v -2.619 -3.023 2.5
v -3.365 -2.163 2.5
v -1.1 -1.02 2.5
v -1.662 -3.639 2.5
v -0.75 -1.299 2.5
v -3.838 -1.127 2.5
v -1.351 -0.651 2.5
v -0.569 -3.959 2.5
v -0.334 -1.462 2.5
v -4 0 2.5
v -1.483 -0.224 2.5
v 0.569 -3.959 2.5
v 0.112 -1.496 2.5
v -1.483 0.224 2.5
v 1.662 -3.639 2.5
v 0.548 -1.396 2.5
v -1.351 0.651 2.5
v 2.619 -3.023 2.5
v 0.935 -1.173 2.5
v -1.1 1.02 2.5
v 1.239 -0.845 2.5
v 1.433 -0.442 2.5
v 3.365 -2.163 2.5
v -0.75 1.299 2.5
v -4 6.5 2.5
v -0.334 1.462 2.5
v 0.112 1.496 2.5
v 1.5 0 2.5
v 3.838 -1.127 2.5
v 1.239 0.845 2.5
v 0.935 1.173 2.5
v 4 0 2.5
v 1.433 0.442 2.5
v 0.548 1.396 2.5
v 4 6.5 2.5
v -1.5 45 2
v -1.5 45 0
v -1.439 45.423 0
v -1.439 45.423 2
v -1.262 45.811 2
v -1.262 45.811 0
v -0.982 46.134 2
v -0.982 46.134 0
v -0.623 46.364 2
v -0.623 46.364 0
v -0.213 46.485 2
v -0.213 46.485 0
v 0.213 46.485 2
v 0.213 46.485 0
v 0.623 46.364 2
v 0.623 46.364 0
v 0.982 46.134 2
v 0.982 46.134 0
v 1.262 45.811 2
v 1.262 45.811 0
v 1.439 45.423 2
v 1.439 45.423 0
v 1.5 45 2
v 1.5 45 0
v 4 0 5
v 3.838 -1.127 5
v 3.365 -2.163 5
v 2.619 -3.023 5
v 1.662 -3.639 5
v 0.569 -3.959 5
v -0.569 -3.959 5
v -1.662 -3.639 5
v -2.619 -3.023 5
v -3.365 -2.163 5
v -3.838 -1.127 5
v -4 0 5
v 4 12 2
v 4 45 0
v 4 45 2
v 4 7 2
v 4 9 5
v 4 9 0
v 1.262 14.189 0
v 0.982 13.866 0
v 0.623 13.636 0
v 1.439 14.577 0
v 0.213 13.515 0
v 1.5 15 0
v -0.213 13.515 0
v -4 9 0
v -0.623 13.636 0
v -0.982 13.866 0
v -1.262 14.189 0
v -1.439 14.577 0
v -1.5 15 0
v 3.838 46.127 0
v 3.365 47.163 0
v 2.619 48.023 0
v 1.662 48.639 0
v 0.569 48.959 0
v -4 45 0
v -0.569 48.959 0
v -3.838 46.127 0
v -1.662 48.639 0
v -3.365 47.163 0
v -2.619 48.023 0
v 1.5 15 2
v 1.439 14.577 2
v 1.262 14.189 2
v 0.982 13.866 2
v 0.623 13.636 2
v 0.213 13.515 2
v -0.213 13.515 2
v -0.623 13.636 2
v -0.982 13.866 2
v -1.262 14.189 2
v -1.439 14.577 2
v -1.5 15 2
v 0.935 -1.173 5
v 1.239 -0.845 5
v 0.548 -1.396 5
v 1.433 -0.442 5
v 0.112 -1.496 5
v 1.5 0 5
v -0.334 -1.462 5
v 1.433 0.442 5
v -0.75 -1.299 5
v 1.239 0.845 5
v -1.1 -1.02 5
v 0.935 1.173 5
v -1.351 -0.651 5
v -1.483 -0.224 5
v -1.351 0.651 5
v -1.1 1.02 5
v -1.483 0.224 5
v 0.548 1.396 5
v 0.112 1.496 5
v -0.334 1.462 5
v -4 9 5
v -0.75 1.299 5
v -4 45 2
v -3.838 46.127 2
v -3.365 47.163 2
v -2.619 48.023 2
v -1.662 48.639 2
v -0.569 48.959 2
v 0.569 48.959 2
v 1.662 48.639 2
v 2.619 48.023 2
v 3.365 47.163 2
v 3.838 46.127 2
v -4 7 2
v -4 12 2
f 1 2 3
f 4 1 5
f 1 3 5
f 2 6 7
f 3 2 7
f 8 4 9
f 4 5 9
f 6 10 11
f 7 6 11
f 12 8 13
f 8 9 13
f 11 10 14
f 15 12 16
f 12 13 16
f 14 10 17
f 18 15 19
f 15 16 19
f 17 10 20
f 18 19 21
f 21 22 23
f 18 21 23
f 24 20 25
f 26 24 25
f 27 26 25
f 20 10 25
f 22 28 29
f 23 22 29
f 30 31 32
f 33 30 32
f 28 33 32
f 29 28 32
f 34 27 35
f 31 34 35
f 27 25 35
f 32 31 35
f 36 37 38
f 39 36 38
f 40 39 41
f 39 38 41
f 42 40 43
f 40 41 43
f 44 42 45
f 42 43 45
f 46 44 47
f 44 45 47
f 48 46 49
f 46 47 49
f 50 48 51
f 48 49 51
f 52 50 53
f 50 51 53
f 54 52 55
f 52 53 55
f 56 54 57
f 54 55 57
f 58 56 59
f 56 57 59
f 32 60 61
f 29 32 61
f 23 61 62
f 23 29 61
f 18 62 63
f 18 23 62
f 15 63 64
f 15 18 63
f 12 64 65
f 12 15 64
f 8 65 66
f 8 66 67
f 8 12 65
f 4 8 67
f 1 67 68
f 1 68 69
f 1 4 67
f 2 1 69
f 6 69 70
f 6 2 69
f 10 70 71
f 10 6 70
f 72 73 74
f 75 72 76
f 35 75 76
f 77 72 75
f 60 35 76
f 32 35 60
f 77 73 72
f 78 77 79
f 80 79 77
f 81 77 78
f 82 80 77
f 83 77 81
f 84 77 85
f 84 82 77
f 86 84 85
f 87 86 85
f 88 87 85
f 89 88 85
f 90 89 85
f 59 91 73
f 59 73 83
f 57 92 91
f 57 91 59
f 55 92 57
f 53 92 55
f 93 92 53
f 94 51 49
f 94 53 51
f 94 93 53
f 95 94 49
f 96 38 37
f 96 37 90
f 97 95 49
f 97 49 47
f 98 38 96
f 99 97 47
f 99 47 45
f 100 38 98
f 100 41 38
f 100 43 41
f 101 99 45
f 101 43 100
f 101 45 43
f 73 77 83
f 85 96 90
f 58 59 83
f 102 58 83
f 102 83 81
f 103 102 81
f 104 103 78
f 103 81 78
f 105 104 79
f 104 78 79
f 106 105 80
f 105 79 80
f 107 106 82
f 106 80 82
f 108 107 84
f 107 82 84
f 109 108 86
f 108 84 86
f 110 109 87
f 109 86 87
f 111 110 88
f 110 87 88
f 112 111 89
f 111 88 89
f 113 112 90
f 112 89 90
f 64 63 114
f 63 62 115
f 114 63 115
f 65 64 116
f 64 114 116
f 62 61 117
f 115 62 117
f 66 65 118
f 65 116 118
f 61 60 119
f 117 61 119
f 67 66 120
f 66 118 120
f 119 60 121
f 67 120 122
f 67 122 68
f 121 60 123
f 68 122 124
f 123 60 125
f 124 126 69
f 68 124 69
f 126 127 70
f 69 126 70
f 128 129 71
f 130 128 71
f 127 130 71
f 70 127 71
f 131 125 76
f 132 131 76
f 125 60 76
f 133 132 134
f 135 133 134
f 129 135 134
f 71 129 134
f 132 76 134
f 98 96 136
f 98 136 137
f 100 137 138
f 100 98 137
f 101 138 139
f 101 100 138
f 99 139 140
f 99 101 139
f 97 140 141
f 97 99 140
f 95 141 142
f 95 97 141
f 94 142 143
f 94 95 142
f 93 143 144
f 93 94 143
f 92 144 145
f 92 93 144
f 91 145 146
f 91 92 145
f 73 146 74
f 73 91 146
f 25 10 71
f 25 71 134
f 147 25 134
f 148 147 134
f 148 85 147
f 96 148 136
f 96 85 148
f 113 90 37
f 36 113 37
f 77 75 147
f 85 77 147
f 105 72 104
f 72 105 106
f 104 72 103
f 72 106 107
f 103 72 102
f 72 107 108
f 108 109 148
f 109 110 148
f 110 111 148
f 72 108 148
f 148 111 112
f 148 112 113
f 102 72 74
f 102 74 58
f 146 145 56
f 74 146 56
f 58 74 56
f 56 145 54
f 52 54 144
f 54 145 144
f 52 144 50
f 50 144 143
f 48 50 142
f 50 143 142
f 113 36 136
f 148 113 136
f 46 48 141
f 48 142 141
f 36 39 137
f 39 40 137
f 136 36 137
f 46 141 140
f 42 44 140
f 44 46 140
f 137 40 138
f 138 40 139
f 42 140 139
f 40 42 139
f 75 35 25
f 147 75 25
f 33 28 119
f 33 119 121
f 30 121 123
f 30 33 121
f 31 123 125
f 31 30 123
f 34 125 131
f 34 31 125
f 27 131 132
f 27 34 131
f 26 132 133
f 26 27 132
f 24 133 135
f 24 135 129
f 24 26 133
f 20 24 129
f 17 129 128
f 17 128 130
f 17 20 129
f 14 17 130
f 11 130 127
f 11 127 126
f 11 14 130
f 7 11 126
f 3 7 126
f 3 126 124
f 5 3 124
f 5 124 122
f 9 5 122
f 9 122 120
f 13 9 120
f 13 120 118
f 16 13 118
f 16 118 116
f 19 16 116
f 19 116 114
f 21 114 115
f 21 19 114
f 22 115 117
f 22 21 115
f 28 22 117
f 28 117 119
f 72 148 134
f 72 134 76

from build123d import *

# Parameters (mm, degrees)
SZKIC1_R                    = 1.5
DODANIE_WYCI_GNI_CIE1_DEPTH = 2
SZKIC2_R                    = 1.5
DODANIE_WYCI_GNI_CIE2_DEPTH = 3
WYTNIJ_WYCI_GNI_CIE1_DEPTH  = 2.5
SFAZOWANIE1_SIZE            = 3
SFAZOWANIE2_SIZE            = 2
SFAZOWANIE3_SIZE            = 0.5


with BuildPart() as part:
    # Szkic1 → Dodanie-wyciągnięcie1 (new body)
    with BuildSketch(Plane.XY):
        with BuildLine():
            Line((-4, 0), (-4, 45))
            ThreePointArc((-4, 45), (0, 49), (4, 45))
            Line((4, 45), (4, 0))
            ThreePointArc((4, 0), (0, -4), (-4, 0))
        make_face()
        Circle(SZKIC1_R, mode=Mode.SUBTRACT)
        with BuildLine():
            Line((1.5, 45), (1.5, 15))
            ThreePointArc((1.5, 15), (0, 13.5), (-1.5, 15))
            Line((-1.5, 15), (-1.5, 45))
            ThreePointArc((-1.5, 45), (0, 46.5), (1.5, 45))
        make_face(mode=Mode.SUBTRACT)
    extrude(amount=DODANIE_WYCI_GNI_CIE1_DEPTH)

    # Szkic2 → Dodanie-wyciągnięcie2 (add)
    with BuildSketch(Plane.XY.offset(2)):
        with BuildLine():
            Line((-4, 9), (4, 9))
            Line((4, 9), (4, 0))
            ThreePointArc((4, 0), (0, -4), (-4, 0))
            Line((-4, 0), (-4, 9))
        make_face()
        Circle(SZKIC2_R, mode=Mode.SUBTRACT)
    extrude(amount=DODANIE_WYCI_GNI_CIE2_DEPTH)

    # Szkic3 → Wytnij-wyciągnięcie1 (cut)
    with BuildSketch(Plane(origin=(0, 0, 0), x_dir=(-1, 0, 0), z_dir=(0, 0, -1))):
        with BuildLine():
            Line((-4, 7), (4, 7))
            Line((4, 7), (4, 0))
            ThreePointArc((4, 0), (0, -4), (-4, 0))
            Line((-4, 0), (-4, 7))
        make_face()
    extrude(amount=-WYTNIJ_WYCI_GNI_CIE1_DEPTH, mode=Mode.SUBTRACT)

    # Sfazowanie1
    sfazowanie1_edges = [part.edges().sort_by_distance(p)[0] for p in [
        (0, 9, 2),
    ]]
    chamfer(sfazowanie1_edges, length=SFAZOWANIE1_SIZE - 0.0001)  # a hair under: the kernel refuses the full size

    # Sfazowanie2
    sfazowanie2_edges = [part.edges().sort_by_distance(p)[0] for p in [
        (0, 7, 0),
    ]]
    chamfer(sfazowanie2_edges, length=SFAZOWANIE2_SIZE)

    # Sfazowanie3
    sfazowanie3_edges = [part.edges().sort_by_distance(p)[0] for p in [
        (0, 7, 2.5),
    ]]
    chamfer(sfazowanie3_edges, length=SFAZOWANIE3_SIZE - 0.0001)  # a hair under: the kernel refuses the full size


solid = part.part
